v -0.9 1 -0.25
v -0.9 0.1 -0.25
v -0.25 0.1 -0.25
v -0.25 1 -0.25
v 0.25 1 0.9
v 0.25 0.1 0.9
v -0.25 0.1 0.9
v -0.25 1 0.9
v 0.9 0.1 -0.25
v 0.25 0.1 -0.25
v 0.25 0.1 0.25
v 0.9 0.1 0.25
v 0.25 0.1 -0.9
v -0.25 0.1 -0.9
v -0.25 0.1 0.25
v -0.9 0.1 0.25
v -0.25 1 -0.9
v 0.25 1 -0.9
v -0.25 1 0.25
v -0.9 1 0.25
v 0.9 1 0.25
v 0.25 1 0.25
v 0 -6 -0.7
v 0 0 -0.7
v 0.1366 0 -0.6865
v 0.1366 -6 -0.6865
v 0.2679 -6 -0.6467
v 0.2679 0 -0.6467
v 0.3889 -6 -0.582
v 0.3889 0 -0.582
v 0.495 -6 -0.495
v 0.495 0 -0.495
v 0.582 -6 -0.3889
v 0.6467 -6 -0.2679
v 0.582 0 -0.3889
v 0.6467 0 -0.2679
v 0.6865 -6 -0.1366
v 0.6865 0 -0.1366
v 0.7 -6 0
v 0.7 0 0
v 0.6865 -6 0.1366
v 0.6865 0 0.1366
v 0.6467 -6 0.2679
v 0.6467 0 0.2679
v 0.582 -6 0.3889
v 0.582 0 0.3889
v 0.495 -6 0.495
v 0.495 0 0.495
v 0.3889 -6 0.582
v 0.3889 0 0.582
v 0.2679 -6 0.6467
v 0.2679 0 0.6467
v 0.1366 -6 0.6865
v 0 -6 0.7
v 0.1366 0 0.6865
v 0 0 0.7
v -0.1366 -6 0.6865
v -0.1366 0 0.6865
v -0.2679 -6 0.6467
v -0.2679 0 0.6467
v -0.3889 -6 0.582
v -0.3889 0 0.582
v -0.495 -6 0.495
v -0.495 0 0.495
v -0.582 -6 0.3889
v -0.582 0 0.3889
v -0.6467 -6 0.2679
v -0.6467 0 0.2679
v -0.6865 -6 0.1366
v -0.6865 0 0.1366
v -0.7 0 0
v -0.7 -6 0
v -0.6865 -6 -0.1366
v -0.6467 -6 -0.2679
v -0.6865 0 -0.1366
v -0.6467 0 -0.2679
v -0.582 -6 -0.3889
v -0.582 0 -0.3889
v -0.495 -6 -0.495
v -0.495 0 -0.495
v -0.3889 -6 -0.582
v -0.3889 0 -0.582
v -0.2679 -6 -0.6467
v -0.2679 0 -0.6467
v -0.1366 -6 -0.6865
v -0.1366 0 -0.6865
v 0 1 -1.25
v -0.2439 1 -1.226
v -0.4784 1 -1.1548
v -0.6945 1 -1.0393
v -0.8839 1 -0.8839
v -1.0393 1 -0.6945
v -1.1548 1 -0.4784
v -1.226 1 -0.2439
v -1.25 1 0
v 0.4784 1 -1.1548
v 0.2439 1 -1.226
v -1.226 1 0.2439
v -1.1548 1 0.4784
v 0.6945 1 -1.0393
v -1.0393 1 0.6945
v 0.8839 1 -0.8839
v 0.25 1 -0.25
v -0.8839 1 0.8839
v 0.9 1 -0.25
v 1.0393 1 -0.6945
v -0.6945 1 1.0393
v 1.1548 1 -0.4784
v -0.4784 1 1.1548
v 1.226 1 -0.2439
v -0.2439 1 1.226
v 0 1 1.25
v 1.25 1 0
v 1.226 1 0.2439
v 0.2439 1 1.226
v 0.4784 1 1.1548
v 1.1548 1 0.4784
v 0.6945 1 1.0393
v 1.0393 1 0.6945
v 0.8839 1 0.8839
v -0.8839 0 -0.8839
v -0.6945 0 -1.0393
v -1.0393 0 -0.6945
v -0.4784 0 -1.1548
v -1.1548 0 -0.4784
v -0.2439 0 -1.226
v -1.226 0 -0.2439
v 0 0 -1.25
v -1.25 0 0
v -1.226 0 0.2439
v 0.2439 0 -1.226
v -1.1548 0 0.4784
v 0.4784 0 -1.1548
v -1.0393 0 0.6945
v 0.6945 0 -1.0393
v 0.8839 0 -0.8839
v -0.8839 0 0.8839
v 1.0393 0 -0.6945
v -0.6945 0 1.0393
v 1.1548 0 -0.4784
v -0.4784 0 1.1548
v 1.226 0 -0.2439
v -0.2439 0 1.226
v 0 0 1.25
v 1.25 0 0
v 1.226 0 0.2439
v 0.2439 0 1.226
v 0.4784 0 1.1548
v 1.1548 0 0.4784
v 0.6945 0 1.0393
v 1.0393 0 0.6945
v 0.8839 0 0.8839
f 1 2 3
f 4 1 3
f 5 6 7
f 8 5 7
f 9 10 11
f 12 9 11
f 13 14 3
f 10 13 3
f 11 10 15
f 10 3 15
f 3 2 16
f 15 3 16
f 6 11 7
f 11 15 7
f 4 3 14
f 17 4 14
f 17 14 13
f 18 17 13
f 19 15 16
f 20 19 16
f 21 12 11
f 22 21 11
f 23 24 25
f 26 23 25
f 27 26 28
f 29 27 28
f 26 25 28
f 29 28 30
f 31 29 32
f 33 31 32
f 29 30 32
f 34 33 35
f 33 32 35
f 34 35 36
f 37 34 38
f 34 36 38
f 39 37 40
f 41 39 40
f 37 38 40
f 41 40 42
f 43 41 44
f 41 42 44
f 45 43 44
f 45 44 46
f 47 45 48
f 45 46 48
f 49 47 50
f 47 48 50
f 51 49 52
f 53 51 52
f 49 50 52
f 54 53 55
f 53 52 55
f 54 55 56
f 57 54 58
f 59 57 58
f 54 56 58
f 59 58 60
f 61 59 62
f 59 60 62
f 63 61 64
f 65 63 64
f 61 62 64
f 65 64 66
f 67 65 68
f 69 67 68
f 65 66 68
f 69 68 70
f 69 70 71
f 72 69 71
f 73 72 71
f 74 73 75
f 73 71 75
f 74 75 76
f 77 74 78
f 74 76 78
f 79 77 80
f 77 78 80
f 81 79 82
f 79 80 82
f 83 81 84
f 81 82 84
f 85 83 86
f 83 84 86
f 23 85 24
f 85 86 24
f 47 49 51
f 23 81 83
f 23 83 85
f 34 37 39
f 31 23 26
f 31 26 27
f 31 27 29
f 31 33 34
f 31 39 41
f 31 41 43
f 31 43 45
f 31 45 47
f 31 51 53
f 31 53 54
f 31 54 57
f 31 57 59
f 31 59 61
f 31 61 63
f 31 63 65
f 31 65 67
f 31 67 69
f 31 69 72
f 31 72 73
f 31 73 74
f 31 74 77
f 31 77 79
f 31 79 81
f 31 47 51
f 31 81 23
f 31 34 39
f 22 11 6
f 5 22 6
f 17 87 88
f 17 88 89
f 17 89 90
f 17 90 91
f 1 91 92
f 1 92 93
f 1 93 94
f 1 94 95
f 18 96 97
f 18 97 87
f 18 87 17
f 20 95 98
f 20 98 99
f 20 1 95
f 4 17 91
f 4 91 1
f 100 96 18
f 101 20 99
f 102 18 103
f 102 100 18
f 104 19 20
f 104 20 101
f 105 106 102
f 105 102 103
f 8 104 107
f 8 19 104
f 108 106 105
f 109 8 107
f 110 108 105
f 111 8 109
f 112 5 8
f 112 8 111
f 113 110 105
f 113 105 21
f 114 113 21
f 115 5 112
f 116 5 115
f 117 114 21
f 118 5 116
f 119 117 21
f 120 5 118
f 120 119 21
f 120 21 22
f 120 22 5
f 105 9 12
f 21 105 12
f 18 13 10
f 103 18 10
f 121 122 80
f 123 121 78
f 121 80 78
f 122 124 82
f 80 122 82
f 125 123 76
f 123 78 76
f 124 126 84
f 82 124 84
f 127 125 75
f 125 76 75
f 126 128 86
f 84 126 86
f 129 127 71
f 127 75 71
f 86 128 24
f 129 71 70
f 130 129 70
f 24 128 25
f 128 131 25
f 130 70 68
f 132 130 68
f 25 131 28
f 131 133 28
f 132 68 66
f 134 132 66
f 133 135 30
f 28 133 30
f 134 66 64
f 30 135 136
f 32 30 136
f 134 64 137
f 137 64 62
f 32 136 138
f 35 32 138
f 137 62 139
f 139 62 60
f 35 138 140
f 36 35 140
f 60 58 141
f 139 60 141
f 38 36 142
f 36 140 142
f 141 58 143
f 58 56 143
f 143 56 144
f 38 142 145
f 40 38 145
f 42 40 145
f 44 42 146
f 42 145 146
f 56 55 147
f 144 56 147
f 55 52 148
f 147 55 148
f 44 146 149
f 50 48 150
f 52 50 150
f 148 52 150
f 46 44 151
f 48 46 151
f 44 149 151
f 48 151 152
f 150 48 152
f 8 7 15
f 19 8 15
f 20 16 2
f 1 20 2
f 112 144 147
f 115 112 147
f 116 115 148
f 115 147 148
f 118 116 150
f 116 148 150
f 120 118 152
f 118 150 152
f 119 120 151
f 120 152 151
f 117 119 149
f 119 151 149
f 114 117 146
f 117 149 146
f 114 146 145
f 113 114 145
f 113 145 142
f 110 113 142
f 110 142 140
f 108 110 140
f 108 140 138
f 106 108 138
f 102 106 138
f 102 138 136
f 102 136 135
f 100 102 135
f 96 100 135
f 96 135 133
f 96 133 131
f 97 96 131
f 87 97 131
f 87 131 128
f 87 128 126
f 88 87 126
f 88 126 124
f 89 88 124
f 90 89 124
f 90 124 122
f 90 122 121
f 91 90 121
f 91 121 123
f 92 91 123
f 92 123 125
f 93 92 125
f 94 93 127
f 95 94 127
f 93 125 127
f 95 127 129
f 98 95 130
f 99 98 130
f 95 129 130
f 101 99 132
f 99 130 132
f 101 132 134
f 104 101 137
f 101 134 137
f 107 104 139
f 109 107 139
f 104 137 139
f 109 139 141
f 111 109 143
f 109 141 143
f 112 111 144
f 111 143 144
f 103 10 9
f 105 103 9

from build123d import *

# Parameters (mm, degrees)
SKETCH1_R           = 1.25
BOSS_EXTRUDE1_DEPTH = 1
SKETCH2_R           = 1.25
BOSS_EXTRUDE2_DEPTH = 0.1
SKETCH3_R           = 0.7
BOSS_EXTRUDE3_DEPTH = 6


with BuildPart() as part:
    # Sketch1 → Boss-Extrude1 (new body)
    with BuildSketch(Plane(origin=(0, 0, 0), x_dir=(1, 0, 0), z_dir=(0, 1, 0))):
        with Locations(Location((0, 0, 0), (0, 0, 270))):
            Circle(SKETCH1_R)
        Polygon((-0.25, -0.25), (-0.9, -0.25), (-0.9, 0.25), (-0.25, 0.25), (-0.25, 0.9), (0.25, 0.9), (0.25, 0.25), (0.9, 0.25), (0.9, -0.25), (0.25, -0.25), (0.25, -0.9), (-0.25, -0.9), align=None, mode=Mode.SUBTRACT)
    extrude(amount=BOSS_EXTRUDE1_DEPTH)

    # Sketch2 → Boss-Extrude2 (add)
    with BuildSketch(Plane.XZ):
        with Locations(Location((0, 0, 0), (0, 0, 90))):
            Circle(SKETCH2_R)
    extrude(amount=-BOSS_EXTRUDE2_DEPTH)

    # Sketch3 → Boss-Extrude3 (add)
    with BuildSketch(Plane.XZ):
        with Locations(Location((0, 0, 0), (0, 0, 270))):
            Circle(SKETCH3_R)
    extrude(amount=BOSS_EXTRUDE3_DEPTH)


solid = part.part
